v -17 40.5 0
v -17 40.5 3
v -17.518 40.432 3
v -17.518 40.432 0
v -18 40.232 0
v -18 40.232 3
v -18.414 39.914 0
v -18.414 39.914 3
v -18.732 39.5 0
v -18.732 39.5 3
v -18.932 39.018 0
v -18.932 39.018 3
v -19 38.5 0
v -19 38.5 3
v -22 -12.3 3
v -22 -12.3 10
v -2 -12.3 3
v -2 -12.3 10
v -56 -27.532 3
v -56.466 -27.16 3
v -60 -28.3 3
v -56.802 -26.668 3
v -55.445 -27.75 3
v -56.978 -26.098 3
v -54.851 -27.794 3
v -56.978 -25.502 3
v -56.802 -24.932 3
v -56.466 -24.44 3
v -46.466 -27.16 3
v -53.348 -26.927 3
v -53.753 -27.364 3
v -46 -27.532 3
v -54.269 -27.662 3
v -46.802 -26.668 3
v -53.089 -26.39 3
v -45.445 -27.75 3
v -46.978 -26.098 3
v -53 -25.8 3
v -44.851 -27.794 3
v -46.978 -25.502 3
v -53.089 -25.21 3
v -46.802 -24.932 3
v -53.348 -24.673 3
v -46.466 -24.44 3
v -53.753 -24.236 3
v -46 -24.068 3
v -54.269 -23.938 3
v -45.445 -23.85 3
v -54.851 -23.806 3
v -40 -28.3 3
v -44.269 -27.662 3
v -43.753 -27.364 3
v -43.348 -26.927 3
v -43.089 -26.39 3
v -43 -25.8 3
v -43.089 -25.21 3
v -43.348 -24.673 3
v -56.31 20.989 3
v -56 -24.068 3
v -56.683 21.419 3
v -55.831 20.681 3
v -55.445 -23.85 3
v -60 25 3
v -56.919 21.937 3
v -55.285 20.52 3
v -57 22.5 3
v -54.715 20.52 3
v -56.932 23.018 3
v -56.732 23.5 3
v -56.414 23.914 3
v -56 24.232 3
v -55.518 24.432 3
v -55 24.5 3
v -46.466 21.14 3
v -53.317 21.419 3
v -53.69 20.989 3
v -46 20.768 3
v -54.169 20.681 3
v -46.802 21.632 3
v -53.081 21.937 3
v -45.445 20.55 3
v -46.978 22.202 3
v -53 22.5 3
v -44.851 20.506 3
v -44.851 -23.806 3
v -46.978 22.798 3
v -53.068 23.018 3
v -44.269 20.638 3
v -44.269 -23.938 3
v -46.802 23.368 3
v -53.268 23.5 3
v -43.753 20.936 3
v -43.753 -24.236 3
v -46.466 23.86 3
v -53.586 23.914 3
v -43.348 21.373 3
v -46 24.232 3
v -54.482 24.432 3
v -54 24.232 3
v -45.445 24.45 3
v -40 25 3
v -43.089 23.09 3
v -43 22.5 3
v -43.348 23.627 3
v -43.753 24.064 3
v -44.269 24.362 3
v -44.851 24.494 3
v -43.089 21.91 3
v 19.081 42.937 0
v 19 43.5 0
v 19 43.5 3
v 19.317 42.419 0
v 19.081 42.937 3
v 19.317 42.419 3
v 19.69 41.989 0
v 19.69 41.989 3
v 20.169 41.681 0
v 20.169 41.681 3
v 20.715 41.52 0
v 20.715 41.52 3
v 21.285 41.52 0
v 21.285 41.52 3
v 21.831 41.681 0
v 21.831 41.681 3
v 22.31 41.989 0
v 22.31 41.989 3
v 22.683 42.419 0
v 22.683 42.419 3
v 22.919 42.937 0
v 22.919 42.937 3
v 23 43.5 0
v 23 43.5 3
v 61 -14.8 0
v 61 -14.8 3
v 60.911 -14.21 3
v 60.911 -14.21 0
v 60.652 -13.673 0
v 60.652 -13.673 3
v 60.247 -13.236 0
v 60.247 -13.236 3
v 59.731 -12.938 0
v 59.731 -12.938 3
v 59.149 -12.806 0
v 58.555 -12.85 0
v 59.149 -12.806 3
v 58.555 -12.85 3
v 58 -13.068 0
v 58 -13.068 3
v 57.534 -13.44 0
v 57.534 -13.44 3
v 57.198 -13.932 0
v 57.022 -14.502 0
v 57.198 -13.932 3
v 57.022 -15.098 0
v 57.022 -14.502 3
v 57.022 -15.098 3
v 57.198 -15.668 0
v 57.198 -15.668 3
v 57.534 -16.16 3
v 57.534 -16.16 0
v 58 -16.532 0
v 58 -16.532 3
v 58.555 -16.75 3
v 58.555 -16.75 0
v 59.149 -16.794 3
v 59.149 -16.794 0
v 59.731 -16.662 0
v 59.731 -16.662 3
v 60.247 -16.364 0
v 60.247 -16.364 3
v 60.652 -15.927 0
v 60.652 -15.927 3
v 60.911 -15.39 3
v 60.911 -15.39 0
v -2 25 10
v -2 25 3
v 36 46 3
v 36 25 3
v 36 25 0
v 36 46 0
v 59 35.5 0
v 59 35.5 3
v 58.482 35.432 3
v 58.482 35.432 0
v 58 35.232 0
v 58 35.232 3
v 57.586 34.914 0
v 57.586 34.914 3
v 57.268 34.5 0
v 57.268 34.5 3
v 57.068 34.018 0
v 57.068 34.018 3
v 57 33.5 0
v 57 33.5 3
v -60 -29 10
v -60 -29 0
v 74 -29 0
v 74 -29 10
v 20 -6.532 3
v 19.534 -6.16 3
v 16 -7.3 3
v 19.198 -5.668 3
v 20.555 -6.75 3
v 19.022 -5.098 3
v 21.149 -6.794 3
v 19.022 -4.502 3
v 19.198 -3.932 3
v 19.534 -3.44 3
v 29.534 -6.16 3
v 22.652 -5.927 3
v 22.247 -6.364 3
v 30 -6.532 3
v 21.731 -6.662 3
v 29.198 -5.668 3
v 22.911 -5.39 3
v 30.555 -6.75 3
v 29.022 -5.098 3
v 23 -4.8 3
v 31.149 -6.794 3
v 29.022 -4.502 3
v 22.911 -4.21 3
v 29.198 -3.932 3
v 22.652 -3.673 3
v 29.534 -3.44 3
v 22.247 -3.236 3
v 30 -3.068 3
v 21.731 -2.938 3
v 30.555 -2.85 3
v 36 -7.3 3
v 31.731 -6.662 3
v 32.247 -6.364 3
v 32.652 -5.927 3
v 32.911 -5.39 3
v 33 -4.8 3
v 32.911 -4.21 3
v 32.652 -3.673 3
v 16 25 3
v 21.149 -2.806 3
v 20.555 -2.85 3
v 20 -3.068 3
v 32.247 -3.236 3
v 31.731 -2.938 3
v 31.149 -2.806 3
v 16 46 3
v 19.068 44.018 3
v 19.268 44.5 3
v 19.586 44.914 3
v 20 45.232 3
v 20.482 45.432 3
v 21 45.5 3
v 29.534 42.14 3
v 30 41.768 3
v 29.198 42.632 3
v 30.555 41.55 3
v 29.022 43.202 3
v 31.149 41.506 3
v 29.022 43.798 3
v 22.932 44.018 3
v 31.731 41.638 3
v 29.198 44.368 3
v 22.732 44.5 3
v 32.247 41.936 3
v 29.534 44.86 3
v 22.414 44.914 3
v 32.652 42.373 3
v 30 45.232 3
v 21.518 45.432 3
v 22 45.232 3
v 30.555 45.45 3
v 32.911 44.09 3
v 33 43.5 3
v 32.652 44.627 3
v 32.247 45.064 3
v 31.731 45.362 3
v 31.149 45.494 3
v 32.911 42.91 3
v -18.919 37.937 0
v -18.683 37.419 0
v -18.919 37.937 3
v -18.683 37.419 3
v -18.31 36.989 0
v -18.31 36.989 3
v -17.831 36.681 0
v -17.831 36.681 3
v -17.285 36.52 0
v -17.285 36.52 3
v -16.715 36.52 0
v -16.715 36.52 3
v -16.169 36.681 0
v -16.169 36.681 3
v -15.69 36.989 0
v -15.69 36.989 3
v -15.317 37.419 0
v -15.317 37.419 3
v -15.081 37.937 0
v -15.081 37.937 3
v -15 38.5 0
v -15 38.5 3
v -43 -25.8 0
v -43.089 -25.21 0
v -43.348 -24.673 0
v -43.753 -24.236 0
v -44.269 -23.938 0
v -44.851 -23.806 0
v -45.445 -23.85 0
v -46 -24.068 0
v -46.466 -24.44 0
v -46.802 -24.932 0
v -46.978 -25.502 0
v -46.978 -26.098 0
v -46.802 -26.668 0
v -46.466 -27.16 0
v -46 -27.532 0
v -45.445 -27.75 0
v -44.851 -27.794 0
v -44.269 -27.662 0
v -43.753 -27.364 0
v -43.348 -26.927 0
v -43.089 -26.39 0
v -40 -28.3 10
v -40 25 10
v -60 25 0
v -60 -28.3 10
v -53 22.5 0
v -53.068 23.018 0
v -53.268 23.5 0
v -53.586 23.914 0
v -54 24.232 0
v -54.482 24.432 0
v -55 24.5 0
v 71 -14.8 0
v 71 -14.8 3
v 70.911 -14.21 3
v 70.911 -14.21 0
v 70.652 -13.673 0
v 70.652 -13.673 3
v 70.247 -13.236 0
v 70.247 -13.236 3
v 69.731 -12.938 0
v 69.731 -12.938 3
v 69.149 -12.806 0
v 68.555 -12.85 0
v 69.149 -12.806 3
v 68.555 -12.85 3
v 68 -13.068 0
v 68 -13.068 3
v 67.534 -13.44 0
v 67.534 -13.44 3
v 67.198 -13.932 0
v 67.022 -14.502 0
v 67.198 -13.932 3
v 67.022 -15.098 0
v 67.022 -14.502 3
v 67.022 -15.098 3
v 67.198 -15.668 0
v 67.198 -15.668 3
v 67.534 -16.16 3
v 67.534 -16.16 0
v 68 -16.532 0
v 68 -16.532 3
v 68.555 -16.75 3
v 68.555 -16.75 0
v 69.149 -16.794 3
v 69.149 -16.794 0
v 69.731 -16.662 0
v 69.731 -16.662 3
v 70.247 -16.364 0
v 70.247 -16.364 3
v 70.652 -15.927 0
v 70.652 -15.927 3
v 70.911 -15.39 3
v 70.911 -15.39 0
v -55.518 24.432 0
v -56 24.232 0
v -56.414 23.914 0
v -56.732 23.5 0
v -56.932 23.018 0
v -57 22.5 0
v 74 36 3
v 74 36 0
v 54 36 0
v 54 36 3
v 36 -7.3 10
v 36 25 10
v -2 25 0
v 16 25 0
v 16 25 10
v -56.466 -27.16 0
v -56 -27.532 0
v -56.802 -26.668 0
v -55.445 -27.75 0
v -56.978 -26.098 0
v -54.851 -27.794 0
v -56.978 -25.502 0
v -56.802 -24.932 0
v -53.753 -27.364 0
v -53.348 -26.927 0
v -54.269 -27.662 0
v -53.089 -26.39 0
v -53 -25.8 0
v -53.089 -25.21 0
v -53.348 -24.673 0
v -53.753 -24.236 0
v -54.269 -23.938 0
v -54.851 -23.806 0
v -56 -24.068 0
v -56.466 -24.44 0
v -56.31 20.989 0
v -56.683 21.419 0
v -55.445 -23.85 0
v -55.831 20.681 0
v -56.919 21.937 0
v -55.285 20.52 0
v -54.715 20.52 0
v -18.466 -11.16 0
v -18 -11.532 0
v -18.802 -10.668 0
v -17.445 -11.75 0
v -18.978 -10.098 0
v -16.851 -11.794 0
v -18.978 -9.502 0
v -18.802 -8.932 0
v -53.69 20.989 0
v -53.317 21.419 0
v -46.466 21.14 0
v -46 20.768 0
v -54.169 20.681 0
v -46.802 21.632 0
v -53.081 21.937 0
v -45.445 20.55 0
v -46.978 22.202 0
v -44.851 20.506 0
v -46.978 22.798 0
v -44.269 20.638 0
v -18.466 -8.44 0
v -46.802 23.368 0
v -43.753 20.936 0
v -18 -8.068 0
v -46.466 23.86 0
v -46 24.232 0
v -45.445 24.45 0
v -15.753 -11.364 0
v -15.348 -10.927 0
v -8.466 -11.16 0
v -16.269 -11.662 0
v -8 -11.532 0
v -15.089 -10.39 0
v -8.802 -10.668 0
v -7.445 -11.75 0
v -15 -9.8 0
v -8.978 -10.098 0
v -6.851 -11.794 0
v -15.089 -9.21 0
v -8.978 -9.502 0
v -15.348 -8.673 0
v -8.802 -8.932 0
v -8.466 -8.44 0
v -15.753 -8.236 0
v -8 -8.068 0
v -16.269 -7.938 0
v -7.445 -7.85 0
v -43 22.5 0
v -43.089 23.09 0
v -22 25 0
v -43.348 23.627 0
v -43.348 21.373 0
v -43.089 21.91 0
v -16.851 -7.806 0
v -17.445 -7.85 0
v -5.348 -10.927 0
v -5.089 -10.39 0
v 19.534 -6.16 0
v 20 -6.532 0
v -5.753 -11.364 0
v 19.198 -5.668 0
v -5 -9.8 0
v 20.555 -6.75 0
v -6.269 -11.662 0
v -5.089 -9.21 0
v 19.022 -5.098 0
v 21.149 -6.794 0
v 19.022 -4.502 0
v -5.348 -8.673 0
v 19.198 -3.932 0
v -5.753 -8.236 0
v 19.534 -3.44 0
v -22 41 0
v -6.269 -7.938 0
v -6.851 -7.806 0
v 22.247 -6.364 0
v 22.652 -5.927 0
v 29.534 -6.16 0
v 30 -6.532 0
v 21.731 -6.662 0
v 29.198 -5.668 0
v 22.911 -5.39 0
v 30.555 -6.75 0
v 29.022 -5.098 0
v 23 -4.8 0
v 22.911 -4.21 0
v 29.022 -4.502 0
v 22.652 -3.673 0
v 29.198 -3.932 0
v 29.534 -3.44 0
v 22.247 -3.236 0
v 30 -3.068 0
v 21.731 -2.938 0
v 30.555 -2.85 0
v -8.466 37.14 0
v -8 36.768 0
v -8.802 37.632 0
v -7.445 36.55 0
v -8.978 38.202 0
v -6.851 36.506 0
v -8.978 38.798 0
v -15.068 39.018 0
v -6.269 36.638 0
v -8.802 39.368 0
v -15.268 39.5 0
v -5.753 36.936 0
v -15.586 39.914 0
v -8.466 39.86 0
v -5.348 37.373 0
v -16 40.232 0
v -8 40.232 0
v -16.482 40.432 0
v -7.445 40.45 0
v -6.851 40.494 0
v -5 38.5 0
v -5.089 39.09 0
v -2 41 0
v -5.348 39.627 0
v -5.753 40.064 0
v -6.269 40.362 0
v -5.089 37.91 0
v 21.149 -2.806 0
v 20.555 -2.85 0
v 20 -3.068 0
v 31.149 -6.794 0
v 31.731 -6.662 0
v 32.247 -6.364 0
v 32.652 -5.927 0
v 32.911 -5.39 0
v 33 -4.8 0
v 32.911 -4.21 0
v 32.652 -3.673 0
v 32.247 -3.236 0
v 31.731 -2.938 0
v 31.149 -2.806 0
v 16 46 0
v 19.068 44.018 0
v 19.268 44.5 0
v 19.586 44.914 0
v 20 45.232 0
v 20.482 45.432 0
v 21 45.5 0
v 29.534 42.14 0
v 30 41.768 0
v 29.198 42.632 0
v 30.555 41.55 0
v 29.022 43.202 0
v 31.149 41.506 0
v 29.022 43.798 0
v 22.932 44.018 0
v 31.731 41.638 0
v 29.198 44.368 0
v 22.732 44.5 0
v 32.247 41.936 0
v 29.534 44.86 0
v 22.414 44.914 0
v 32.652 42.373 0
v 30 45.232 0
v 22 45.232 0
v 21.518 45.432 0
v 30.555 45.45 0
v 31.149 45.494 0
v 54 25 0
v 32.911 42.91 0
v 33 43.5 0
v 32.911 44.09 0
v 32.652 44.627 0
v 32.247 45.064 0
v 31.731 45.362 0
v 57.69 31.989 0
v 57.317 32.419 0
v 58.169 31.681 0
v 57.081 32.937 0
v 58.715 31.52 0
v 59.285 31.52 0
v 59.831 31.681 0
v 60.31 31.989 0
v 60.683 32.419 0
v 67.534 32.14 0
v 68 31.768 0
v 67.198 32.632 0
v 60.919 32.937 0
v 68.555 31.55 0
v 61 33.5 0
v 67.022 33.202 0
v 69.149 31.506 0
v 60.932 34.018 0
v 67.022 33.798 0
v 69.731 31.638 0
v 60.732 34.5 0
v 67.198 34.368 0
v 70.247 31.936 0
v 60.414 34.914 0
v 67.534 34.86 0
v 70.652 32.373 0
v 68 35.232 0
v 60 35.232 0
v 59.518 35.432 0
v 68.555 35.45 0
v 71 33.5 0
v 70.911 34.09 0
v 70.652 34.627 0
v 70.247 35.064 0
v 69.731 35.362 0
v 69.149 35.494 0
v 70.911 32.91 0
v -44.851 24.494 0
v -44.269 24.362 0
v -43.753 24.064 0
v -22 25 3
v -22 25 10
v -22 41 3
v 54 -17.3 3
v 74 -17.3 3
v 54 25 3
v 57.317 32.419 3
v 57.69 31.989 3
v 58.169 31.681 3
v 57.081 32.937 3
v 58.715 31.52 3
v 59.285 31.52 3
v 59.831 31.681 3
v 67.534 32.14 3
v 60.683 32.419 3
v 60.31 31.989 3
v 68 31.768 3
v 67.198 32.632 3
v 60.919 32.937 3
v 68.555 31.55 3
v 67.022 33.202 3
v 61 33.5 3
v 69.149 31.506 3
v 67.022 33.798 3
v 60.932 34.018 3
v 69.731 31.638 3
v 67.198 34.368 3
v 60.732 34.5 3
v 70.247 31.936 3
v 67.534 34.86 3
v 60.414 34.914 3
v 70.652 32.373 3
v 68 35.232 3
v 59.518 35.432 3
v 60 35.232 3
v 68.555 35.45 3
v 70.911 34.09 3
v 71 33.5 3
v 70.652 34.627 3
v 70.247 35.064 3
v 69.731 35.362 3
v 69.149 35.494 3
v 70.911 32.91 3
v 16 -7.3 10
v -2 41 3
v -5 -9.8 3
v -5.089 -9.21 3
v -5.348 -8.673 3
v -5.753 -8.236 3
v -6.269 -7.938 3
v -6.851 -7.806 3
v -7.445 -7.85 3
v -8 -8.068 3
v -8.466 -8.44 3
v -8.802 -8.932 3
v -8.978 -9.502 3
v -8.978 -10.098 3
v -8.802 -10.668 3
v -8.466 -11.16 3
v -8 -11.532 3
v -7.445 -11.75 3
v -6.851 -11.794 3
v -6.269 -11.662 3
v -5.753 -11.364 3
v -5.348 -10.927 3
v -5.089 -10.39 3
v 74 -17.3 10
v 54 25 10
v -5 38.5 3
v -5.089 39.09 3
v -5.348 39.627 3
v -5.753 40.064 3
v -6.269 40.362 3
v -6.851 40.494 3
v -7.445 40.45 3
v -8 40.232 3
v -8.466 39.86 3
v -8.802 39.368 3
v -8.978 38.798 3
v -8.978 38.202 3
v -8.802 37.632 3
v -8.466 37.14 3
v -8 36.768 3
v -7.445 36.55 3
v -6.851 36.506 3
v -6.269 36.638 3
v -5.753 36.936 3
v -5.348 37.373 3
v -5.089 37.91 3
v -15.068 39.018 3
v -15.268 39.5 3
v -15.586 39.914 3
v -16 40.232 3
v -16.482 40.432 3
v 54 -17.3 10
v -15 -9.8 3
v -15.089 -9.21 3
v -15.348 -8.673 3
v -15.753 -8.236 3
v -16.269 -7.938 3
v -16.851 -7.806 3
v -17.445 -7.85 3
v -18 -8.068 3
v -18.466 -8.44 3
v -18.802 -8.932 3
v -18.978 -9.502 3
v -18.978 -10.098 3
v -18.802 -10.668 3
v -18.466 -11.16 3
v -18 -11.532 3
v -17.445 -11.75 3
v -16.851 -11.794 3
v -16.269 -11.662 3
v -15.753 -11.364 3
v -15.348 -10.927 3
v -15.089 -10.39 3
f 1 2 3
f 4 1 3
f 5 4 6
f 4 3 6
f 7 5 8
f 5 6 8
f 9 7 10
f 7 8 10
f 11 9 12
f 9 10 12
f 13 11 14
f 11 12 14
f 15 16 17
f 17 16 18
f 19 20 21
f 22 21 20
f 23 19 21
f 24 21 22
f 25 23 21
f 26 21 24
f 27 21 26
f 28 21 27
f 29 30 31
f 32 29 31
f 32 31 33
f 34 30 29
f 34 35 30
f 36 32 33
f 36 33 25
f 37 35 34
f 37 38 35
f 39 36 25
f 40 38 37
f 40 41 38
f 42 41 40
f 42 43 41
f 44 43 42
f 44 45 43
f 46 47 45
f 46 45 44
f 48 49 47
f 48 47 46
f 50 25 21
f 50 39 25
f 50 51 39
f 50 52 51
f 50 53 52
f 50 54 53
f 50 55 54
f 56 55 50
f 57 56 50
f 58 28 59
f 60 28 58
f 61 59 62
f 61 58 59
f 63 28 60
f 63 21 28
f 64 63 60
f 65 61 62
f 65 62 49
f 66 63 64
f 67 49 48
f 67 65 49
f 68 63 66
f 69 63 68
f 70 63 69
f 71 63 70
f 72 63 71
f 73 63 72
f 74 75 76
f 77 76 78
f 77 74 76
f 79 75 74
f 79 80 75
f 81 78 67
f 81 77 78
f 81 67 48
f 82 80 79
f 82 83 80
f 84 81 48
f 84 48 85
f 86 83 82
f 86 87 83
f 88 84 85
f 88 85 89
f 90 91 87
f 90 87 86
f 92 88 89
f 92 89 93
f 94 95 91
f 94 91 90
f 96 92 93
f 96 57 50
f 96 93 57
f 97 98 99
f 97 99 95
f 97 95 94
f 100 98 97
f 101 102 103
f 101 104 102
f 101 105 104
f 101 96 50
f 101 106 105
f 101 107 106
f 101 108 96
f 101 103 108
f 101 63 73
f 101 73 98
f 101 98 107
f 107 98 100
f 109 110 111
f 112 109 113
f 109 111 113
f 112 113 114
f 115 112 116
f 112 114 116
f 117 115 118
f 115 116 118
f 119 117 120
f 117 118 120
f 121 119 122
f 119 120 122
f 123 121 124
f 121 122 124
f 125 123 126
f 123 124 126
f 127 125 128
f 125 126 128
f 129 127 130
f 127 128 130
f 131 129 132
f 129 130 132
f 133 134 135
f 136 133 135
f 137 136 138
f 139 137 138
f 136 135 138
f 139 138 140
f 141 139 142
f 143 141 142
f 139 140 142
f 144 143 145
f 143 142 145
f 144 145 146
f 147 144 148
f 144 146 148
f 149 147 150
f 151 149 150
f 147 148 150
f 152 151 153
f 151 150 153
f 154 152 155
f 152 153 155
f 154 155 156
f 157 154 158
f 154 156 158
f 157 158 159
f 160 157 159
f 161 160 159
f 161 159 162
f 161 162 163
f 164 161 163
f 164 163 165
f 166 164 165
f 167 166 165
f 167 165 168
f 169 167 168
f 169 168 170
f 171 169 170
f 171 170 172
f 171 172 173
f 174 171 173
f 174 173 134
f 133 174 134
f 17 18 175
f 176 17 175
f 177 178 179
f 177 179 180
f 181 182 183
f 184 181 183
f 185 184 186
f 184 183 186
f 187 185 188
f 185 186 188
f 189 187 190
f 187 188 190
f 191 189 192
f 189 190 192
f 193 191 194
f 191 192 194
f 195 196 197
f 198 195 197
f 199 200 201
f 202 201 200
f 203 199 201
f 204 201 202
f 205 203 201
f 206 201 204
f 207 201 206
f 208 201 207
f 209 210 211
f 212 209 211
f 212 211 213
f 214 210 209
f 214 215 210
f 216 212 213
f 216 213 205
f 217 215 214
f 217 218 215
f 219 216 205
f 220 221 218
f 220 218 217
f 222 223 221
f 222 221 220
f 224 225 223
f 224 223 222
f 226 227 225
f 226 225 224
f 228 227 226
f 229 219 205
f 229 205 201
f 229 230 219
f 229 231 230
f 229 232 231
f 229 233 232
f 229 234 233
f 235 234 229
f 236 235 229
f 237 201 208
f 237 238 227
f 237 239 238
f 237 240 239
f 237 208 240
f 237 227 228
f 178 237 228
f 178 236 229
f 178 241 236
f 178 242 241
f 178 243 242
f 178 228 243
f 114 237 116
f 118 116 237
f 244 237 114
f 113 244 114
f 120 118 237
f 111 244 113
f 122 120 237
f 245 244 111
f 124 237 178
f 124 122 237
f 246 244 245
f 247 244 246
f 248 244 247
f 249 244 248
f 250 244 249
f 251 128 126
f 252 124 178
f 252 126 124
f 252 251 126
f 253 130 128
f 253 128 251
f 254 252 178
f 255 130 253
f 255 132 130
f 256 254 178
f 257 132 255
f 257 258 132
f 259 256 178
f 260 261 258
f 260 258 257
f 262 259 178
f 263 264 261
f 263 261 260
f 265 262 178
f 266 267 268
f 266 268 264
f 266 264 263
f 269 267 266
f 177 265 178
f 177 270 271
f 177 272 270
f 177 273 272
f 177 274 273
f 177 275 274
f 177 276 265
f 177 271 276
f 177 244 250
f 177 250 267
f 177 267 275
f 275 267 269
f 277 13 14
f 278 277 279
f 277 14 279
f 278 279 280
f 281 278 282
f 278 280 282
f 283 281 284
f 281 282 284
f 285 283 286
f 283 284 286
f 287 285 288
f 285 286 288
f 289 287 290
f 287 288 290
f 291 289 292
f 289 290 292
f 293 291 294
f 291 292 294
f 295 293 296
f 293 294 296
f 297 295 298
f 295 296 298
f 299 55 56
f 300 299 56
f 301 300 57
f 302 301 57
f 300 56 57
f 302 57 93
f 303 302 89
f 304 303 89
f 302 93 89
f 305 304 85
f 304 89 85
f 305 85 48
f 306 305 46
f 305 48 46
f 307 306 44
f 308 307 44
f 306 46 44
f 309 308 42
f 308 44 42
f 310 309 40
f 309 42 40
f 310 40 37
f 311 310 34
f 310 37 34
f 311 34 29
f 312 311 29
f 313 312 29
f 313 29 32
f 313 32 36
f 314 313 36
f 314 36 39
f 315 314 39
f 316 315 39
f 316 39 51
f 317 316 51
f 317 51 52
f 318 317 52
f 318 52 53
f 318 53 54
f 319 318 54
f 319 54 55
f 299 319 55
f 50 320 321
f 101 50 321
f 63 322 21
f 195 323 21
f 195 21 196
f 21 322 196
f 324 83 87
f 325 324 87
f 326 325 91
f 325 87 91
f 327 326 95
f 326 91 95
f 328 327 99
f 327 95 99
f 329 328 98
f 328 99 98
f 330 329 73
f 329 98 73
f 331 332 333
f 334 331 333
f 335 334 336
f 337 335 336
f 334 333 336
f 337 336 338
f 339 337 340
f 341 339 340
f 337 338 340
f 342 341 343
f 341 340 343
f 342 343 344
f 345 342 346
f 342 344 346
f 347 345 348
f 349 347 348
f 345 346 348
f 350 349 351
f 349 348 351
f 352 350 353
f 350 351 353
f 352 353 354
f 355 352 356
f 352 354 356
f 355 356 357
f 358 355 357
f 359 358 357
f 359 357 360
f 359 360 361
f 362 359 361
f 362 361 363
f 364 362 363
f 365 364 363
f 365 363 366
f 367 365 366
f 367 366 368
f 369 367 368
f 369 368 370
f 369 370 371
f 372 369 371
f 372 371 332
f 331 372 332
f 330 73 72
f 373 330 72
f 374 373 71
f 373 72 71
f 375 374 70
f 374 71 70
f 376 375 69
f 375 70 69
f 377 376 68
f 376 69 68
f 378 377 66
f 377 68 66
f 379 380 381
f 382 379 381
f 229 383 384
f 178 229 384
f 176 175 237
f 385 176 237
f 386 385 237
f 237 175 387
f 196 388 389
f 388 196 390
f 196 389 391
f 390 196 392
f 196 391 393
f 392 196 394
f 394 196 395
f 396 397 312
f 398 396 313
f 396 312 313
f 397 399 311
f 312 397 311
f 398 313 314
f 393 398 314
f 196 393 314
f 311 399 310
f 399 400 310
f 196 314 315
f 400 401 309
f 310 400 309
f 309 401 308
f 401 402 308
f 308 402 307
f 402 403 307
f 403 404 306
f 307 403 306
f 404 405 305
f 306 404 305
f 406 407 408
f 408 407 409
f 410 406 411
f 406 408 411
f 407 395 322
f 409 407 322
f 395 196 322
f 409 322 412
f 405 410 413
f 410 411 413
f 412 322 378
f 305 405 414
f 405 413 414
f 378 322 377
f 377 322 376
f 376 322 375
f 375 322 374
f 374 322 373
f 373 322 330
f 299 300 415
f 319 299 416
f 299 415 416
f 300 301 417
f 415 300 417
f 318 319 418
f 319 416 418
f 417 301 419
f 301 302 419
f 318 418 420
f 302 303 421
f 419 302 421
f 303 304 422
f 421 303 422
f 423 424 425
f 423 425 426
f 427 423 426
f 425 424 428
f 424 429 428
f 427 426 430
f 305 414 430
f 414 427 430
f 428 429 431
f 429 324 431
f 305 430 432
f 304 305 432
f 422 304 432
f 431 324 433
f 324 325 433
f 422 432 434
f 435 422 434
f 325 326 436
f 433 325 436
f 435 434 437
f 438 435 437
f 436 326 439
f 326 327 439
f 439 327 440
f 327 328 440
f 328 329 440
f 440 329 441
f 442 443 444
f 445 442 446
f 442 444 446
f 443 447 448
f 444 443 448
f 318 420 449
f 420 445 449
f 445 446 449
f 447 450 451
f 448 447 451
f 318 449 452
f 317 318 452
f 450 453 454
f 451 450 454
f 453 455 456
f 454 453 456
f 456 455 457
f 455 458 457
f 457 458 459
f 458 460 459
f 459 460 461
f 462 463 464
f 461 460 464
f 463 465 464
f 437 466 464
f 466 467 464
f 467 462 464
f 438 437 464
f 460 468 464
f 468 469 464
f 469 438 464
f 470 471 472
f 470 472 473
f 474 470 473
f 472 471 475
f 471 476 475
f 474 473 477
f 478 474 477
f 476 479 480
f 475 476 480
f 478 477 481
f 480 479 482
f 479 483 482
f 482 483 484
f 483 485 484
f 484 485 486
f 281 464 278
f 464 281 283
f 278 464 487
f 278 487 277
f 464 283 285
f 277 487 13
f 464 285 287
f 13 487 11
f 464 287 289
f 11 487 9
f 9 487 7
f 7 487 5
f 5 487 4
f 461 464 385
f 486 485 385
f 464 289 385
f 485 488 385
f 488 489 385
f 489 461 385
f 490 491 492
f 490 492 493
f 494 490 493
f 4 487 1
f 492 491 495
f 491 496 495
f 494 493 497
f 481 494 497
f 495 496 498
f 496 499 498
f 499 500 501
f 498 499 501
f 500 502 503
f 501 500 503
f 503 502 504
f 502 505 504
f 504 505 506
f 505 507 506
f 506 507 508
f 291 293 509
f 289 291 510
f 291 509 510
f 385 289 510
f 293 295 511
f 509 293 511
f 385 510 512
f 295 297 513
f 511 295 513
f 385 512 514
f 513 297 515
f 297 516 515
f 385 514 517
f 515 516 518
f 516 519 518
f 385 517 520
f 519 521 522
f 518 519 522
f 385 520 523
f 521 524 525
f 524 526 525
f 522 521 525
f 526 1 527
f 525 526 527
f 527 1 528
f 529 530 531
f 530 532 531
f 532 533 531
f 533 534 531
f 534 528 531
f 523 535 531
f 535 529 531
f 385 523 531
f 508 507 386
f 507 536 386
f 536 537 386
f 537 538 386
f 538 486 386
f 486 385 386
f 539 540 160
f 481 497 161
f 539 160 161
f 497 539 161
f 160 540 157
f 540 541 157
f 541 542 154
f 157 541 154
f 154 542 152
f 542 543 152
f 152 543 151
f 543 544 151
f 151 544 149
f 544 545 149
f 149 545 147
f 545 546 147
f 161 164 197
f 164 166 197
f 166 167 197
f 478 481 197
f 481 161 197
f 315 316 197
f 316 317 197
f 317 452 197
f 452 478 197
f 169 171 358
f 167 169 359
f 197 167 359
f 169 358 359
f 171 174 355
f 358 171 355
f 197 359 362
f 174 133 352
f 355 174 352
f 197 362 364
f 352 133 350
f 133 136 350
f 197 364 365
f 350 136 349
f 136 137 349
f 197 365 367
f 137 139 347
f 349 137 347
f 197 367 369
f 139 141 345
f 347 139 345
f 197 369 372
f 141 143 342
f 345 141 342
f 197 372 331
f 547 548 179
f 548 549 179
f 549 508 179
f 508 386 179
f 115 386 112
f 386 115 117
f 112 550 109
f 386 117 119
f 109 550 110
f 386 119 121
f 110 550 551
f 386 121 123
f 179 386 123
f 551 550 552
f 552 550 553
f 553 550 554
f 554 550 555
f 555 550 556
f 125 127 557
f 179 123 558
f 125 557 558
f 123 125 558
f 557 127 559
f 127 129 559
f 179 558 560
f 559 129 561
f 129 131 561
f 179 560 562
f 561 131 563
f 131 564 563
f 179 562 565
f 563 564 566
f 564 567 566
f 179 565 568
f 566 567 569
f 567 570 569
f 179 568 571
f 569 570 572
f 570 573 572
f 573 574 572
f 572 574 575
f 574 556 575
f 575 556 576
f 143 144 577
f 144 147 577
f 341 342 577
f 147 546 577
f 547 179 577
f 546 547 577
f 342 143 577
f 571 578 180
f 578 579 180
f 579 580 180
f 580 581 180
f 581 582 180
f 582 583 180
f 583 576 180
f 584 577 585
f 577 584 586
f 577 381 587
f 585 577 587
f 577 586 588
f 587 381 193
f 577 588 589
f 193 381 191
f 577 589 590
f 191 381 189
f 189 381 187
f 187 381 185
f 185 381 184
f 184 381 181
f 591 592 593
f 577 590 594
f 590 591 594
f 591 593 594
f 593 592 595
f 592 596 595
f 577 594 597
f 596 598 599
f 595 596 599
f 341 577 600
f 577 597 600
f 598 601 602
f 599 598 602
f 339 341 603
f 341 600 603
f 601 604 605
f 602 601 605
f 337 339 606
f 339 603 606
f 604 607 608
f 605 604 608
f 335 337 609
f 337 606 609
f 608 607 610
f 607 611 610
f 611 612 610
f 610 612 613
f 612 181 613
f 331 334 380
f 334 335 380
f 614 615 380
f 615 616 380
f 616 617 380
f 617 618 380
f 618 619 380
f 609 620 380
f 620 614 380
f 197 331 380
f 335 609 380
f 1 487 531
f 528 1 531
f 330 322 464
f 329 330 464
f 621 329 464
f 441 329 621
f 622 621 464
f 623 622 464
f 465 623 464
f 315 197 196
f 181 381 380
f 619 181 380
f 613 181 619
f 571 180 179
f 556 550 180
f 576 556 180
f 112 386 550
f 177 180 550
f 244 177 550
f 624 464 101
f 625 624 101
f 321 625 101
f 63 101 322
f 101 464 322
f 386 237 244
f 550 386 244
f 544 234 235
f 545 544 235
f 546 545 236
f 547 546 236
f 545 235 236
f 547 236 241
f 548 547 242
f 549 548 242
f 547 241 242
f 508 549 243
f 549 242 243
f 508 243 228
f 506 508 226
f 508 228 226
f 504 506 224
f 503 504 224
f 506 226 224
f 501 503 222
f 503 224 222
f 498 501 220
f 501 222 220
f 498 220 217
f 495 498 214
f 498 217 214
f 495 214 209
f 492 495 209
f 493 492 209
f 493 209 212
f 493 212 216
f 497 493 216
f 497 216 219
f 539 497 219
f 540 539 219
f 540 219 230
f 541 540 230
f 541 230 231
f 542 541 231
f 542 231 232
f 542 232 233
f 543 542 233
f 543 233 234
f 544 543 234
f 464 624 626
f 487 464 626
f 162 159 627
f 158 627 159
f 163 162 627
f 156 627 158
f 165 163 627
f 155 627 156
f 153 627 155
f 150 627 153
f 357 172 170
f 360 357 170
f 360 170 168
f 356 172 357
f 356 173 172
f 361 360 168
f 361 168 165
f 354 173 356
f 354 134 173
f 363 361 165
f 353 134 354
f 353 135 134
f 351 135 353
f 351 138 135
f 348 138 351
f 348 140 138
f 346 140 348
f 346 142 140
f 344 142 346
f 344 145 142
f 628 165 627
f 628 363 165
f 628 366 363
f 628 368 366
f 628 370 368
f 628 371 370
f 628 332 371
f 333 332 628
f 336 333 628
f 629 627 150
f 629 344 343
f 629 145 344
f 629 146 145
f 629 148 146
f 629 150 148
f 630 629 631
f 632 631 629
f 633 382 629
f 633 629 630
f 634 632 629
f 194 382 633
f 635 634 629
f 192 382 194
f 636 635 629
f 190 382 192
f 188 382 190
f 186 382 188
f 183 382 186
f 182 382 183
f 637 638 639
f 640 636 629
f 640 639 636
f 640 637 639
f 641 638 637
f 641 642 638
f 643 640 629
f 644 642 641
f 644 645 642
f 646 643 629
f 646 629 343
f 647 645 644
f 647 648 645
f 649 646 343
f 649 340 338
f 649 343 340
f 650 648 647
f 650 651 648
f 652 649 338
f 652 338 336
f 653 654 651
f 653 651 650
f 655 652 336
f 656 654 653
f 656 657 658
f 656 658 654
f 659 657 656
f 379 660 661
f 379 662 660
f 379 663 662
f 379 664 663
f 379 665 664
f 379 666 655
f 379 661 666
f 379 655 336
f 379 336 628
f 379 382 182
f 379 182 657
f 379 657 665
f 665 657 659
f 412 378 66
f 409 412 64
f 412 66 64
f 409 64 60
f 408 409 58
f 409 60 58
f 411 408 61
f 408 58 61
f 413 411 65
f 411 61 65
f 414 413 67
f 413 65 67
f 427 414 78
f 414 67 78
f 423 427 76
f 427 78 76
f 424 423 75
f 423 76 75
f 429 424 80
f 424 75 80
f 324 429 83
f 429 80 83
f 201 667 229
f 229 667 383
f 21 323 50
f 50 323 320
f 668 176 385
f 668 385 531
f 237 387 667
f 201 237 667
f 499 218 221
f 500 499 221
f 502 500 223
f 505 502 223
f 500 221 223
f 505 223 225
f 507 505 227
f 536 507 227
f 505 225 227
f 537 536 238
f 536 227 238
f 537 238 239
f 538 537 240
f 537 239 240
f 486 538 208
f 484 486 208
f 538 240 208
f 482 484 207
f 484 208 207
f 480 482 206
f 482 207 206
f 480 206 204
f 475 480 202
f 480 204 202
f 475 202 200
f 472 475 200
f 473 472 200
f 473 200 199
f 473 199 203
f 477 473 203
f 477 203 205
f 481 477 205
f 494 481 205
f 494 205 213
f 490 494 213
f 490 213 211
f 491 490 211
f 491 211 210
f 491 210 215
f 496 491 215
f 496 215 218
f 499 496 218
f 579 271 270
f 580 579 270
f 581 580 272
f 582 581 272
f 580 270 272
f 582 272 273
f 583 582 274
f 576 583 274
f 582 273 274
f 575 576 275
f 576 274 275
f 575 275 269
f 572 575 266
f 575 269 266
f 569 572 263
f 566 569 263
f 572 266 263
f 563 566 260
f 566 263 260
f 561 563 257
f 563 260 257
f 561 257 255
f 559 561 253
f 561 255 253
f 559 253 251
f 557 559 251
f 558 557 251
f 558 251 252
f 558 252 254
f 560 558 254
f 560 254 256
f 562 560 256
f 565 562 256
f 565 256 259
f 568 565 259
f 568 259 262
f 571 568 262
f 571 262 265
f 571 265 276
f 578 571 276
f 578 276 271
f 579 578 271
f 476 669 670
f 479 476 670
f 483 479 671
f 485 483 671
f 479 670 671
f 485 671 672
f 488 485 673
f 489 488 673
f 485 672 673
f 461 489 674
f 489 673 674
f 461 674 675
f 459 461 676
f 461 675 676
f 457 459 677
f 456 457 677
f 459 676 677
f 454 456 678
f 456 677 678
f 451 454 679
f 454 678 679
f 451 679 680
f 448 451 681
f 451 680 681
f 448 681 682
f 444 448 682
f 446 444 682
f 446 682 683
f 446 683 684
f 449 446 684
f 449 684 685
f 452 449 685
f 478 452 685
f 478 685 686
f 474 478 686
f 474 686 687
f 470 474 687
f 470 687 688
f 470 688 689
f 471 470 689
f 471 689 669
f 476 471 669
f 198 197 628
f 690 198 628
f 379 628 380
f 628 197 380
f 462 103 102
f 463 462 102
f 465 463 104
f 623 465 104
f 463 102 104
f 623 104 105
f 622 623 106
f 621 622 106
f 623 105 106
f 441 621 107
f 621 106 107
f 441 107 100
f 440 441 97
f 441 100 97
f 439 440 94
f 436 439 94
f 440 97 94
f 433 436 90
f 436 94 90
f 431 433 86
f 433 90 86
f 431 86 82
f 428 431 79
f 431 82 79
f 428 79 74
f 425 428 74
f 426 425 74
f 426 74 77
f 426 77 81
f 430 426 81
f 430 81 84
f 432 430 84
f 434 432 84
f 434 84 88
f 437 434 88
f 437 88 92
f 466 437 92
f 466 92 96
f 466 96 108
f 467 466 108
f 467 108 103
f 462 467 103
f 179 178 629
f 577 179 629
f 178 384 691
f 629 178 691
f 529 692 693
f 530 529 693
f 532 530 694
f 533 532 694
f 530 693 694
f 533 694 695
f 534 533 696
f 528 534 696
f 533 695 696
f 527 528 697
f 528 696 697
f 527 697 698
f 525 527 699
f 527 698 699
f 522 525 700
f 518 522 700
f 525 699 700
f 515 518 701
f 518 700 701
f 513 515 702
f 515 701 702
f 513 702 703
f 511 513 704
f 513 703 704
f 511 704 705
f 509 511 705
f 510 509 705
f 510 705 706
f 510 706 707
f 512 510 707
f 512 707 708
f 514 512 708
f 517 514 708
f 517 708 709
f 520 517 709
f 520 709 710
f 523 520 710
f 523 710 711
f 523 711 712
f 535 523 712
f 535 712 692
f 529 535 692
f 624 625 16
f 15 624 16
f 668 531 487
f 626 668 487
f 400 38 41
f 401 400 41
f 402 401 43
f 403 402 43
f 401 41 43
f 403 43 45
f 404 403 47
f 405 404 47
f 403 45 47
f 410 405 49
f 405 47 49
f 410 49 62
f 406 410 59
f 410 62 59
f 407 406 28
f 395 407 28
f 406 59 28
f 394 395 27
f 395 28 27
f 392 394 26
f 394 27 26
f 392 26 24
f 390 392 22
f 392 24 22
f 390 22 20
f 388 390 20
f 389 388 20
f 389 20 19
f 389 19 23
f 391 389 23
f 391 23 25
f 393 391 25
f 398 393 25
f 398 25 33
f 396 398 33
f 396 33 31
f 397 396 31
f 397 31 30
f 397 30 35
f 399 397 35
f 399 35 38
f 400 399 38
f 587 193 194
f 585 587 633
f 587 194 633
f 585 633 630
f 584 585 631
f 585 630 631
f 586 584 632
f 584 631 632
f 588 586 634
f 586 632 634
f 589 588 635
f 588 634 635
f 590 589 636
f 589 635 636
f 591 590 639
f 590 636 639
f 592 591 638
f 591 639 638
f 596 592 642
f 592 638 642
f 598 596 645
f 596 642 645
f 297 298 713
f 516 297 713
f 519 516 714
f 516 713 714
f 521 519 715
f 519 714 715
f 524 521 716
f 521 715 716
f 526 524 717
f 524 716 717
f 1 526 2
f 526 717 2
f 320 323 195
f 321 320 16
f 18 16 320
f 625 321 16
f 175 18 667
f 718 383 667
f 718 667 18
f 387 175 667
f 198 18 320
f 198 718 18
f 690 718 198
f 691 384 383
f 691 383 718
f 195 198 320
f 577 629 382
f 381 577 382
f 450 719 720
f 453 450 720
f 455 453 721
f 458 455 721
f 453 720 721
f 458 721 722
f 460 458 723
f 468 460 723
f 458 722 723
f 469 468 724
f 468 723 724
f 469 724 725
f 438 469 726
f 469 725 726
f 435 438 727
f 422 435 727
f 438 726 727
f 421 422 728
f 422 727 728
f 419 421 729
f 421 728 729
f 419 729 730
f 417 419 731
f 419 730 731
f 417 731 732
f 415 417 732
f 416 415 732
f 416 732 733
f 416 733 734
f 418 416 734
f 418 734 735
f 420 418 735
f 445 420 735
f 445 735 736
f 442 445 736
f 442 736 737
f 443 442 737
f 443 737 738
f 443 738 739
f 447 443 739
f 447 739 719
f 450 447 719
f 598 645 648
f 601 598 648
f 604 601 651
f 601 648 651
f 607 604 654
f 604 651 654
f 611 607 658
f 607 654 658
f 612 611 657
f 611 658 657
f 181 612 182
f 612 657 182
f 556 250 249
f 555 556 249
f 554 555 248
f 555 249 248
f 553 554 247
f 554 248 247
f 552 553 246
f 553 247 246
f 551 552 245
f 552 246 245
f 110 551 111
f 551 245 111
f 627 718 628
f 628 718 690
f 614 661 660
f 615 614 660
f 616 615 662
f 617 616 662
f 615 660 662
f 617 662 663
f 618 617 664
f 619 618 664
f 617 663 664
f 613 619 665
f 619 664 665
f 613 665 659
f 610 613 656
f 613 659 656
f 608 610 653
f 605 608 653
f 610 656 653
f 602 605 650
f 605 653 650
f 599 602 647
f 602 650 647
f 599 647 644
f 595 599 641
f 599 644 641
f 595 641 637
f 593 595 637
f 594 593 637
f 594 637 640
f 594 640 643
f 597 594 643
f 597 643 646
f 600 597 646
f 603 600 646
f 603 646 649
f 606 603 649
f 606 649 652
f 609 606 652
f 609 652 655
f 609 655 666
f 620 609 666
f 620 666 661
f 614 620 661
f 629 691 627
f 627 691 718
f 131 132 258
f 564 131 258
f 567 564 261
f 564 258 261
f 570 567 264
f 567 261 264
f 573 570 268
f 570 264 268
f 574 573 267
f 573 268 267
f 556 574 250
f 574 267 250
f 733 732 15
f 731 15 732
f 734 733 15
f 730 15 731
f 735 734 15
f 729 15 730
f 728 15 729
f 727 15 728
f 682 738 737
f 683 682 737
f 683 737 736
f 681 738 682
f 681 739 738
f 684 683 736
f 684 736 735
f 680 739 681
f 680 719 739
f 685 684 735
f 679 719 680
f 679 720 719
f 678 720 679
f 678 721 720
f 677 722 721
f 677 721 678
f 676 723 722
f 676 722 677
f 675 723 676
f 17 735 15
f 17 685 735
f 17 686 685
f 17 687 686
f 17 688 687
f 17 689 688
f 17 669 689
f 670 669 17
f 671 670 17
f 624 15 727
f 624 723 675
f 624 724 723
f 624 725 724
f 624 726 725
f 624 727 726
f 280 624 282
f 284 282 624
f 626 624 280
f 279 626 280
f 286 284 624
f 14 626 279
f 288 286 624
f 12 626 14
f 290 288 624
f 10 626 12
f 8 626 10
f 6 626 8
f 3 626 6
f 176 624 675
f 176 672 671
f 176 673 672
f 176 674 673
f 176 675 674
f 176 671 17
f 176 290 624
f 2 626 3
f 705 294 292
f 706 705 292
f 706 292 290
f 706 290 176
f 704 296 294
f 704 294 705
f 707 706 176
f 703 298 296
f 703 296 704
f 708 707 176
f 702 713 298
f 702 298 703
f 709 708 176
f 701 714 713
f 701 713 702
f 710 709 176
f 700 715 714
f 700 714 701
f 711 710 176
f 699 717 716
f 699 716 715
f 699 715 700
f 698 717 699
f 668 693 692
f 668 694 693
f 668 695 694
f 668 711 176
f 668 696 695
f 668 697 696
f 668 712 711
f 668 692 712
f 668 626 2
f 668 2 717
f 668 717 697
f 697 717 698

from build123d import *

# Parameters (mm, degrees)
BOSS_EXTRUDE1_DEPTH = 10
CUT_EXTRUDE1_REACH  = 89.704
SKETCH3_R           = 2
SKETCH3_11_W        = 20
SKETCH3_11_H        = 53.3
SKETCH3_11_R        = 2
CUT_EXTRUDE2_DEPTH  = 7
CUT_EXTRUDE3_REACH  = 89.704
SKETCH4_W           = 9
SKETCH4_H           = 16.003442502
SKETCH4_W_2         = 18
SKETCH4_H_2         = 21
SKETCH4_H_3         = 21.24342545


with BuildPart() as part:
    # Sketch1 → Boss-Extrude1 (new body)
    with BuildSketch(Plane.XY):
        Polygon((-31, 25), (-60, 25), (-60, -29), (74, -29), (74, 36), (45, 36), (45, 46), (7, 46), (7, 41), (-31, 41), align=None)
    extrude(amount=BOSS_EXTRUDE1_DEPTH)

    # Sketch3 → Cut-Extrude1 (cut, up to next)
    with BuildSketch(Plane.XY.offset(10), mode=Mode.PRIVATE) as cut_extrude1_sk1:
        with Locations((-55, 22.5)):
            Circle(SKETCH3_R)
    cut_extrude1_tool1 = extrude(cut_extrude1_sk1.sketch, amount=-CUT_EXTRUDE1_REACH, mode=Mode.PRIVATE) & part.part
    # Sketch3 → Cut-Extrude1 (cut, up to next)
    with BuildSketch(Plane.XY.offset(10), mode=Mode.PRIVATE) as cut_extrude1_sk2:
        with Locations((-17, 38.5)):
            Circle(SKETCH3_R)
    cut_extrude1_tool2 = extrude(cut_extrude1_sk2.sketch, amount=-CUT_EXTRUDE1_REACH, mode=Mode.PRIVATE) & part.part
    # Sketch3 → Cut-Extrude1 (cut, up to next)
    with BuildSketch(Plane.XY.offset(10), mode=Mode.PRIVATE) as cut_extrude1_sk3:
        with Locations((21, 43.5)):
            Circle(SKETCH3_R)
    cut_extrude1_tool3 = extrude(cut_extrude1_sk3.sketch, amount=-CUT_EXTRUDE1_REACH, mode=Mode.PRIVATE) & part.part
    # Sketch3 → Cut-Extrude1 (cut, up to next)
    with BuildSketch(Plane.XY.offset(10), mode=Mode.PRIVATE) as cut_extrude1_sk4:
        with Locations((59, 33.5)):
            Circle(SKETCH3_R)
    cut_extrude1_tool4 = extrude(cut_extrude1_sk4.sketch, amount=-CUT_EXTRUDE1_REACH, mode=Mode.PRIVATE) & part.part
    # Sketch3 → Cut-Extrude1 (cut, up to next)
    with BuildSketch(Plane.XY.offset(10), mode=Mode.PRIVATE) as cut_extrude1_sk5:
        with Locations((-45, 22.5)):
            Circle(SKETCH3_R)
    cut_extrude1_tool5 = extrude(cut_extrude1_sk5.sketch, amount=-CUT_EXTRUDE1_REACH, mode=Mode.PRIVATE) & part.part
    # Sketch3 → Cut-Extrude1 (cut, up to next)
    with BuildSketch(Plane.XY.offset(10), mode=Mode.PRIVATE) as cut_extrude1_sk6:
        with Locations((-45, -25.8)):
            Circle(SKETCH3_R)
    cut_extrude1_tool6 = extrude(cut_extrude1_sk6.sketch, amount=-CUT_EXTRUDE1_REACH, mode=Mode.PRIVATE) & part.part
    # Sketch3 → Cut-Extrude1 (cut, up to next)
    with BuildSketch(Plane.XY.offset(10), mode=Mode.PRIVATE) as cut_extrude1_sk7:
        with Locations((-55, -25.8)):
            Circle(SKETCH3_R)
    cut_extrude1_tool7 = extrude(cut_extrude1_sk7.sketch, amount=-CUT_EXTRUDE1_REACH, mode=Mode.PRIVATE) & part.part
    # Sketch3 → Cut-Extrude1 (cut, up to next)
    with BuildSketch(Plane.XY.offset(10), mode=Mode.PRIVATE) as cut_extrude1_sk8:
        with Locations((-7, 38.5)):
            Circle(SKETCH3_R)
    cut_extrude1_tool8 = extrude(cut_extrude1_sk8.sketch, amount=-CUT_EXTRUDE1_REACH, mode=Mode.PRIVATE) & part.part
    # Sketch3 → Cut-Extrude1 (cut, up to next)
    with BuildSketch(Plane.XY.offset(10), mode=Mode.PRIVATE) as cut_extrude1_sk9:
        with Locations((-7, -9.8)):
            Circle(SKETCH3_R)
    cut_extrude1_tool9 = extrude(cut_extrude1_sk9.sketch, amount=-CUT_EXTRUDE1_REACH, mode=Mode.PRIVATE) & part.part
    # Sketch3 → Cut-Extrude1 (cut, up to next)
    with BuildSketch(Plane.XY.offset(10), mode=Mode.PRIVATE) as cut_extrude1_sk10:
        with Locations((-17, -9.8)):
            Circle(SKETCH3_R)
    cut_extrude1_tool10 = extrude(cut_extrude1_sk10.sketch, amount=-CUT_EXTRUDE1_REACH, mode=Mode.PRIVATE) & part.part
    # Sketch3 → Cut-Extrude1 (cut, up to next)
    with BuildSketch(Plane.XY.offset(10), mode=Mode.PRIVATE) as cut_extrude1_sk11:
        with Locations((31, 43.5)):
            Circle(SKETCH3_R)
    cut_extrude1_tool11 = extrude(cut_extrude1_sk11.sketch, amount=-CUT_EXTRUDE1_REACH, mode=Mode.PRIVATE) & part.part
    # Sketch3 → Cut-Extrude1 (cut, up to next)
    with BuildSketch(Plane.XY.offset(10), mode=Mode.PRIVATE) as cut_extrude1_sk12:
        with Locations((31, -4.8)):
            Circle(SKETCH3_R)
    cut_extrude1_tool12 = extrude(cut_extrude1_sk12.sketch, amount=-CUT_EXTRUDE1_REACH, mode=Mode.PRIVATE) & part.part
    # Sketch3 → Cut-Extrude1 (cut, up to next)
    with BuildSketch(Plane.XY.offset(10), mode=Mode.PRIVATE) as cut_extrude1_sk13:
        with Locations((21, -4.8)):
            Circle(SKETCH3_R)
    cut_extrude1_tool13 = extrude(cut_extrude1_sk13.sketch, amount=-CUT_EXTRUDE1_REACH, mode=Mode.PRIVATE) & part.part
    # Sketch3 → Cut-Extrude1 (cut, up to next)
    with BuildSketch(Plane.XY.offset(10), mode=Mode.PRIVATE) as cut_extrude1_sk14:
        with Locations((69, 33.5)):
            Circle(SKETCH3_R)
    cut_extrude1_tool14 = extrude(cut_extrude1_sk14.sketch, amount=-CUT_EXTRUDE1_REACH, mode=Mode.PRIVATE) & part.part
    # Sketch3 → Cut-Extrude1 (cut, up to next)
    with BuildSketch(Plane.XY.offset(10), mode=Mode.PRIVATE) as cut_extrude1_sk15:
        with Locations((69, -14.8)):
            Circle(SKETCH3_R)
    cut_extrude1_tool15 = extrude(cut_extrude1_sk15.sketch, amount=-CUT_EXTRUDE1_REACH, mode=Mode.PRIVATE) & part.part
    # Sketch3 → Cut-Extrude1 (cut, up to next)
    with BuildSketch(Plane.XY.offset(10), mode=Mode.PRIVATE) as cut_extrude1_sk16:
        with Locations((59, -14.8)):
            Circle(SKETCH3_R)
    cut_extrude1_tool16 = extrude(cut_extrude1_sk16.sketch, amount=-CUT_EXTRUDE1_REACH, mode=Mode.PRIVATE) & part.part
    add(cut_extrude1_tool1.solids().sort_by_distance((-55, 22.5, 10))[0], mode=Mode.SUBTRACT)
    add(cut_extrude1_tool2.solids().sort_by_distance((-17, 38.5, 10))[0], mode=Mode.SUBTRACT)
    add(cut_extrude1_tool3.solids().sort_by_distance((21, 43.5, 10))[0], mode=Mode.SUBTRACT)
    add(cut_extrude1_tool4.solids().sort_by_distance((59, 33.5, 10))[0], mode=Mode.SUBTRACT)
    add(cut_extrude1_tool5.solids().sort_by_distance((-45, 22.5, 10))[0], mode=Mode.SUBTRACT)
    add(cut_extrude1_tool6.solids().sort_by_distance((-45, -25.8, 10))[0], mode=Mode.SUBTRACT)
    add(cut_extrude1_tool7.solids().sort_by_distance((-55, -25.8, 10))[0], mode=Mode.SUBTRACT)
    add(cut_extrude1_tool8.solids().sort_by_distance((-7, 38.5, 10))[0], mode=Mode.SUBTRACT)
    add(cut_extrude1_tool9.solids().sort_by_distance((-7, -9.8, 10))[0], mode=Mode.SUBTRACT)
    add(cut_extrude1_tool10.solids().sort_by_distance((-17, -9.8, 10))[0], mode=Mode.SUBTRACT)
    add(cut_extrude1_tool11.solids().sort_by_distance((31, 43.5, 10))[0], mode=Mode.SUBTRACT)
    add(cut_extrude1_tool12.solids().sort_by_distance((31, -4.8, 10))[0], mode=Mode.SUBTRACT)
    add(cut_extrude1_tool13.solids().sort_by_distance((21, -4.8, 10))[0], mode=Mode.SUBTRACT)
    add(cut_extrude1_tool14.solids().sort_by_distance((69, 33.5, 10))[0], mode=Mode.SUBTRACT)
    add(cut_extrude1_tool15.solids().sort_by_distance((69, -14.8, 10))[0], mode=Mode.SUBTRACT)
    add(cut_extrude1_tool16.solids().sort_by_distance((59, -14.8, 10))[0], mode=Mode.SUBTRACT)

    # Sketch3<11> → Cut-Extrude2 (cut)
    # profile 1 of 4: a face of its own
    with BuildSketch(Plane.XY.offset(10)):
        with Locations((-50, -1.65)):
            Rectangle(SKETCH3_11_W, SKETCH3_11_H)
        with Locations((-55, 22.5)):
            Circle(SKETCH3_11_R, mode=Mode.SUBTRACT)
        with Locations((-45, 22.5)):
            Circle(SKETCH3_11_R, mode=Mode.SUBTRACT)
        with Locations((-55, -25.8)):
            Circle(SKETCH3_11_R, mode=Mode.SUBTRACT)
        with Locations((-45, -25.8)):
            Circle(SKETCH3_11_R, mode=Mode.SUBTRACT)
    # profile 2 of 4: a face of its own
    with BuildSketch(Plane.XY.offset(10)):
        with Locations((-12, 14.35)):
            Rectangle(SKETCH3_11_W, SKETCH3_11_H)
        with Locations((-17, 38.5)):
            Circle(SKETCH3_11_R, mode=Mode.SUBTRACT)
        with Locations((-17, -9.8)):
            Circle(SKETCH3_11_R, mode=Mode.SUBTRACT)
        with Locations((-7, 38.5)):
            Circle(SKETCH3_11_R, mode=Mode.SUBTRACT)
        with Locations((-7, -9.8)):
            Circle(SKETCH3_11_R, mode=Mode.SUBTRACT)
    # profile 3 of 4: a face of its own
    with BuildSketch(Plane.XY.offset(10)):
        with Locations((26, 19.35)):
            Rectangle(SKETCH3_11_W, SKETCH3_11_H)
        with Locations((21, 43.5)):
            Circle(SKETCH3_11_R, mode=Mode.SUBTRACT)
        with Locations((21, -4.8)):
            Circle(SKETCH3_11_R, mode=Mode.SUBTRACT)
        with Locations((31, 43.5)):
            Circle(SKETCH3_11_R, mode=Mode.SUBTRACT)
        with Locations((31, -4.8)):
            Circle(SKETCH3_11_R, mode=Mode.SUBTRACT)
    # profile 4 of 4: a face of its own
    with BuildSketch(Plane.XY.offset(10)):
        with Locations((64, 9.35)):
            Rectangle(SKETCH3_11_W, SKETCH3_11_H)
        with Locations((59, 33.5)):
            Circle(SKETCH3_11_R, mode=Mode.SUBTRACT)
        with Locations((59, -14.8)):
            Circle(SKETCH3_11_R, mode=Mode.SUBTRACT)
        with Locations((69, 33.5)):
            Circle(SKETCH3_11_R, mode=Mode.SUBTRACT)
        with Locations((69, -14.8)):
            Circle(SKETCH3_11_R, mode=Mode.SUBTRACT)
    extrude(amount=-CUT_EXTRUDE2_DEPTH, mode=Mode.SUBTRACT)

    # Sketch4 → Cut-Extrude3 (cut, up to next)
    with BuildSketch(Plane.XY.offset(10), mode=Mode.PRIVATE) as cut_extrude3_sk1:
        with Locations((-26.5, 33.001721251)):
            Rectangle(SKETCH4_W, SKETCH4_H)
    cut_extrude3_tool1 = extrude(cut_extrude3_sk1.sketch, amount=-CUT_EXTRUDE3_REACH, mode=Mode.PRIVATE) & part.part
    # Sketch4 → Cut-Extrude3 (cut, up to next)
    with BuildSketch(Plane.XY.offset(10), mode=Mode.PRIVATE) as cut_extrude3_sk2:
        with Locations((7, 35.5)):
            Rectangle(SKETCH4_W_2, SKETCH4_H_2)
    cut_extrude3_tool2 = extrude(cut_extrude3_sk2.sketch, amount=-CUT_EXTRUDE3_REACH, mode=Mode.PRIVATE) & part.part
    # Sketch4 → Cut-Extrude3 (cut, up to next)
    with BuildSketch(Plane.XY.offset(10), mode=Mode.PRIVATE) as cut_extrude3_sk3:
        with Locations((45, 35.621712725)):
            Rectangle(SKETCH4_W_2, SKETCH4_H_3)
    cut_extrude3_tool3 = extrude(cut_extrude3_sk3.sketch, amount=-CUT_EXTRUDE3_REACH, mode=Mode.PRIVATE) & part.part
    add(cut_extrude3_tool1.solids().sort_by_distance((-26.5, 33.001721, 10))[0], mode=Mode.SUBTRACT)
    add(cut_extrude3_tool2.solids().sort_by_distance((7, 35.5, 10))[0], mode=Mode.SUBTRACT)
    add(cut_extrude3_tool3.solids().sort_by_distance((45, 35.621713, 10))[0], mode=Mode.SUBTRACT)


solid = part.part
